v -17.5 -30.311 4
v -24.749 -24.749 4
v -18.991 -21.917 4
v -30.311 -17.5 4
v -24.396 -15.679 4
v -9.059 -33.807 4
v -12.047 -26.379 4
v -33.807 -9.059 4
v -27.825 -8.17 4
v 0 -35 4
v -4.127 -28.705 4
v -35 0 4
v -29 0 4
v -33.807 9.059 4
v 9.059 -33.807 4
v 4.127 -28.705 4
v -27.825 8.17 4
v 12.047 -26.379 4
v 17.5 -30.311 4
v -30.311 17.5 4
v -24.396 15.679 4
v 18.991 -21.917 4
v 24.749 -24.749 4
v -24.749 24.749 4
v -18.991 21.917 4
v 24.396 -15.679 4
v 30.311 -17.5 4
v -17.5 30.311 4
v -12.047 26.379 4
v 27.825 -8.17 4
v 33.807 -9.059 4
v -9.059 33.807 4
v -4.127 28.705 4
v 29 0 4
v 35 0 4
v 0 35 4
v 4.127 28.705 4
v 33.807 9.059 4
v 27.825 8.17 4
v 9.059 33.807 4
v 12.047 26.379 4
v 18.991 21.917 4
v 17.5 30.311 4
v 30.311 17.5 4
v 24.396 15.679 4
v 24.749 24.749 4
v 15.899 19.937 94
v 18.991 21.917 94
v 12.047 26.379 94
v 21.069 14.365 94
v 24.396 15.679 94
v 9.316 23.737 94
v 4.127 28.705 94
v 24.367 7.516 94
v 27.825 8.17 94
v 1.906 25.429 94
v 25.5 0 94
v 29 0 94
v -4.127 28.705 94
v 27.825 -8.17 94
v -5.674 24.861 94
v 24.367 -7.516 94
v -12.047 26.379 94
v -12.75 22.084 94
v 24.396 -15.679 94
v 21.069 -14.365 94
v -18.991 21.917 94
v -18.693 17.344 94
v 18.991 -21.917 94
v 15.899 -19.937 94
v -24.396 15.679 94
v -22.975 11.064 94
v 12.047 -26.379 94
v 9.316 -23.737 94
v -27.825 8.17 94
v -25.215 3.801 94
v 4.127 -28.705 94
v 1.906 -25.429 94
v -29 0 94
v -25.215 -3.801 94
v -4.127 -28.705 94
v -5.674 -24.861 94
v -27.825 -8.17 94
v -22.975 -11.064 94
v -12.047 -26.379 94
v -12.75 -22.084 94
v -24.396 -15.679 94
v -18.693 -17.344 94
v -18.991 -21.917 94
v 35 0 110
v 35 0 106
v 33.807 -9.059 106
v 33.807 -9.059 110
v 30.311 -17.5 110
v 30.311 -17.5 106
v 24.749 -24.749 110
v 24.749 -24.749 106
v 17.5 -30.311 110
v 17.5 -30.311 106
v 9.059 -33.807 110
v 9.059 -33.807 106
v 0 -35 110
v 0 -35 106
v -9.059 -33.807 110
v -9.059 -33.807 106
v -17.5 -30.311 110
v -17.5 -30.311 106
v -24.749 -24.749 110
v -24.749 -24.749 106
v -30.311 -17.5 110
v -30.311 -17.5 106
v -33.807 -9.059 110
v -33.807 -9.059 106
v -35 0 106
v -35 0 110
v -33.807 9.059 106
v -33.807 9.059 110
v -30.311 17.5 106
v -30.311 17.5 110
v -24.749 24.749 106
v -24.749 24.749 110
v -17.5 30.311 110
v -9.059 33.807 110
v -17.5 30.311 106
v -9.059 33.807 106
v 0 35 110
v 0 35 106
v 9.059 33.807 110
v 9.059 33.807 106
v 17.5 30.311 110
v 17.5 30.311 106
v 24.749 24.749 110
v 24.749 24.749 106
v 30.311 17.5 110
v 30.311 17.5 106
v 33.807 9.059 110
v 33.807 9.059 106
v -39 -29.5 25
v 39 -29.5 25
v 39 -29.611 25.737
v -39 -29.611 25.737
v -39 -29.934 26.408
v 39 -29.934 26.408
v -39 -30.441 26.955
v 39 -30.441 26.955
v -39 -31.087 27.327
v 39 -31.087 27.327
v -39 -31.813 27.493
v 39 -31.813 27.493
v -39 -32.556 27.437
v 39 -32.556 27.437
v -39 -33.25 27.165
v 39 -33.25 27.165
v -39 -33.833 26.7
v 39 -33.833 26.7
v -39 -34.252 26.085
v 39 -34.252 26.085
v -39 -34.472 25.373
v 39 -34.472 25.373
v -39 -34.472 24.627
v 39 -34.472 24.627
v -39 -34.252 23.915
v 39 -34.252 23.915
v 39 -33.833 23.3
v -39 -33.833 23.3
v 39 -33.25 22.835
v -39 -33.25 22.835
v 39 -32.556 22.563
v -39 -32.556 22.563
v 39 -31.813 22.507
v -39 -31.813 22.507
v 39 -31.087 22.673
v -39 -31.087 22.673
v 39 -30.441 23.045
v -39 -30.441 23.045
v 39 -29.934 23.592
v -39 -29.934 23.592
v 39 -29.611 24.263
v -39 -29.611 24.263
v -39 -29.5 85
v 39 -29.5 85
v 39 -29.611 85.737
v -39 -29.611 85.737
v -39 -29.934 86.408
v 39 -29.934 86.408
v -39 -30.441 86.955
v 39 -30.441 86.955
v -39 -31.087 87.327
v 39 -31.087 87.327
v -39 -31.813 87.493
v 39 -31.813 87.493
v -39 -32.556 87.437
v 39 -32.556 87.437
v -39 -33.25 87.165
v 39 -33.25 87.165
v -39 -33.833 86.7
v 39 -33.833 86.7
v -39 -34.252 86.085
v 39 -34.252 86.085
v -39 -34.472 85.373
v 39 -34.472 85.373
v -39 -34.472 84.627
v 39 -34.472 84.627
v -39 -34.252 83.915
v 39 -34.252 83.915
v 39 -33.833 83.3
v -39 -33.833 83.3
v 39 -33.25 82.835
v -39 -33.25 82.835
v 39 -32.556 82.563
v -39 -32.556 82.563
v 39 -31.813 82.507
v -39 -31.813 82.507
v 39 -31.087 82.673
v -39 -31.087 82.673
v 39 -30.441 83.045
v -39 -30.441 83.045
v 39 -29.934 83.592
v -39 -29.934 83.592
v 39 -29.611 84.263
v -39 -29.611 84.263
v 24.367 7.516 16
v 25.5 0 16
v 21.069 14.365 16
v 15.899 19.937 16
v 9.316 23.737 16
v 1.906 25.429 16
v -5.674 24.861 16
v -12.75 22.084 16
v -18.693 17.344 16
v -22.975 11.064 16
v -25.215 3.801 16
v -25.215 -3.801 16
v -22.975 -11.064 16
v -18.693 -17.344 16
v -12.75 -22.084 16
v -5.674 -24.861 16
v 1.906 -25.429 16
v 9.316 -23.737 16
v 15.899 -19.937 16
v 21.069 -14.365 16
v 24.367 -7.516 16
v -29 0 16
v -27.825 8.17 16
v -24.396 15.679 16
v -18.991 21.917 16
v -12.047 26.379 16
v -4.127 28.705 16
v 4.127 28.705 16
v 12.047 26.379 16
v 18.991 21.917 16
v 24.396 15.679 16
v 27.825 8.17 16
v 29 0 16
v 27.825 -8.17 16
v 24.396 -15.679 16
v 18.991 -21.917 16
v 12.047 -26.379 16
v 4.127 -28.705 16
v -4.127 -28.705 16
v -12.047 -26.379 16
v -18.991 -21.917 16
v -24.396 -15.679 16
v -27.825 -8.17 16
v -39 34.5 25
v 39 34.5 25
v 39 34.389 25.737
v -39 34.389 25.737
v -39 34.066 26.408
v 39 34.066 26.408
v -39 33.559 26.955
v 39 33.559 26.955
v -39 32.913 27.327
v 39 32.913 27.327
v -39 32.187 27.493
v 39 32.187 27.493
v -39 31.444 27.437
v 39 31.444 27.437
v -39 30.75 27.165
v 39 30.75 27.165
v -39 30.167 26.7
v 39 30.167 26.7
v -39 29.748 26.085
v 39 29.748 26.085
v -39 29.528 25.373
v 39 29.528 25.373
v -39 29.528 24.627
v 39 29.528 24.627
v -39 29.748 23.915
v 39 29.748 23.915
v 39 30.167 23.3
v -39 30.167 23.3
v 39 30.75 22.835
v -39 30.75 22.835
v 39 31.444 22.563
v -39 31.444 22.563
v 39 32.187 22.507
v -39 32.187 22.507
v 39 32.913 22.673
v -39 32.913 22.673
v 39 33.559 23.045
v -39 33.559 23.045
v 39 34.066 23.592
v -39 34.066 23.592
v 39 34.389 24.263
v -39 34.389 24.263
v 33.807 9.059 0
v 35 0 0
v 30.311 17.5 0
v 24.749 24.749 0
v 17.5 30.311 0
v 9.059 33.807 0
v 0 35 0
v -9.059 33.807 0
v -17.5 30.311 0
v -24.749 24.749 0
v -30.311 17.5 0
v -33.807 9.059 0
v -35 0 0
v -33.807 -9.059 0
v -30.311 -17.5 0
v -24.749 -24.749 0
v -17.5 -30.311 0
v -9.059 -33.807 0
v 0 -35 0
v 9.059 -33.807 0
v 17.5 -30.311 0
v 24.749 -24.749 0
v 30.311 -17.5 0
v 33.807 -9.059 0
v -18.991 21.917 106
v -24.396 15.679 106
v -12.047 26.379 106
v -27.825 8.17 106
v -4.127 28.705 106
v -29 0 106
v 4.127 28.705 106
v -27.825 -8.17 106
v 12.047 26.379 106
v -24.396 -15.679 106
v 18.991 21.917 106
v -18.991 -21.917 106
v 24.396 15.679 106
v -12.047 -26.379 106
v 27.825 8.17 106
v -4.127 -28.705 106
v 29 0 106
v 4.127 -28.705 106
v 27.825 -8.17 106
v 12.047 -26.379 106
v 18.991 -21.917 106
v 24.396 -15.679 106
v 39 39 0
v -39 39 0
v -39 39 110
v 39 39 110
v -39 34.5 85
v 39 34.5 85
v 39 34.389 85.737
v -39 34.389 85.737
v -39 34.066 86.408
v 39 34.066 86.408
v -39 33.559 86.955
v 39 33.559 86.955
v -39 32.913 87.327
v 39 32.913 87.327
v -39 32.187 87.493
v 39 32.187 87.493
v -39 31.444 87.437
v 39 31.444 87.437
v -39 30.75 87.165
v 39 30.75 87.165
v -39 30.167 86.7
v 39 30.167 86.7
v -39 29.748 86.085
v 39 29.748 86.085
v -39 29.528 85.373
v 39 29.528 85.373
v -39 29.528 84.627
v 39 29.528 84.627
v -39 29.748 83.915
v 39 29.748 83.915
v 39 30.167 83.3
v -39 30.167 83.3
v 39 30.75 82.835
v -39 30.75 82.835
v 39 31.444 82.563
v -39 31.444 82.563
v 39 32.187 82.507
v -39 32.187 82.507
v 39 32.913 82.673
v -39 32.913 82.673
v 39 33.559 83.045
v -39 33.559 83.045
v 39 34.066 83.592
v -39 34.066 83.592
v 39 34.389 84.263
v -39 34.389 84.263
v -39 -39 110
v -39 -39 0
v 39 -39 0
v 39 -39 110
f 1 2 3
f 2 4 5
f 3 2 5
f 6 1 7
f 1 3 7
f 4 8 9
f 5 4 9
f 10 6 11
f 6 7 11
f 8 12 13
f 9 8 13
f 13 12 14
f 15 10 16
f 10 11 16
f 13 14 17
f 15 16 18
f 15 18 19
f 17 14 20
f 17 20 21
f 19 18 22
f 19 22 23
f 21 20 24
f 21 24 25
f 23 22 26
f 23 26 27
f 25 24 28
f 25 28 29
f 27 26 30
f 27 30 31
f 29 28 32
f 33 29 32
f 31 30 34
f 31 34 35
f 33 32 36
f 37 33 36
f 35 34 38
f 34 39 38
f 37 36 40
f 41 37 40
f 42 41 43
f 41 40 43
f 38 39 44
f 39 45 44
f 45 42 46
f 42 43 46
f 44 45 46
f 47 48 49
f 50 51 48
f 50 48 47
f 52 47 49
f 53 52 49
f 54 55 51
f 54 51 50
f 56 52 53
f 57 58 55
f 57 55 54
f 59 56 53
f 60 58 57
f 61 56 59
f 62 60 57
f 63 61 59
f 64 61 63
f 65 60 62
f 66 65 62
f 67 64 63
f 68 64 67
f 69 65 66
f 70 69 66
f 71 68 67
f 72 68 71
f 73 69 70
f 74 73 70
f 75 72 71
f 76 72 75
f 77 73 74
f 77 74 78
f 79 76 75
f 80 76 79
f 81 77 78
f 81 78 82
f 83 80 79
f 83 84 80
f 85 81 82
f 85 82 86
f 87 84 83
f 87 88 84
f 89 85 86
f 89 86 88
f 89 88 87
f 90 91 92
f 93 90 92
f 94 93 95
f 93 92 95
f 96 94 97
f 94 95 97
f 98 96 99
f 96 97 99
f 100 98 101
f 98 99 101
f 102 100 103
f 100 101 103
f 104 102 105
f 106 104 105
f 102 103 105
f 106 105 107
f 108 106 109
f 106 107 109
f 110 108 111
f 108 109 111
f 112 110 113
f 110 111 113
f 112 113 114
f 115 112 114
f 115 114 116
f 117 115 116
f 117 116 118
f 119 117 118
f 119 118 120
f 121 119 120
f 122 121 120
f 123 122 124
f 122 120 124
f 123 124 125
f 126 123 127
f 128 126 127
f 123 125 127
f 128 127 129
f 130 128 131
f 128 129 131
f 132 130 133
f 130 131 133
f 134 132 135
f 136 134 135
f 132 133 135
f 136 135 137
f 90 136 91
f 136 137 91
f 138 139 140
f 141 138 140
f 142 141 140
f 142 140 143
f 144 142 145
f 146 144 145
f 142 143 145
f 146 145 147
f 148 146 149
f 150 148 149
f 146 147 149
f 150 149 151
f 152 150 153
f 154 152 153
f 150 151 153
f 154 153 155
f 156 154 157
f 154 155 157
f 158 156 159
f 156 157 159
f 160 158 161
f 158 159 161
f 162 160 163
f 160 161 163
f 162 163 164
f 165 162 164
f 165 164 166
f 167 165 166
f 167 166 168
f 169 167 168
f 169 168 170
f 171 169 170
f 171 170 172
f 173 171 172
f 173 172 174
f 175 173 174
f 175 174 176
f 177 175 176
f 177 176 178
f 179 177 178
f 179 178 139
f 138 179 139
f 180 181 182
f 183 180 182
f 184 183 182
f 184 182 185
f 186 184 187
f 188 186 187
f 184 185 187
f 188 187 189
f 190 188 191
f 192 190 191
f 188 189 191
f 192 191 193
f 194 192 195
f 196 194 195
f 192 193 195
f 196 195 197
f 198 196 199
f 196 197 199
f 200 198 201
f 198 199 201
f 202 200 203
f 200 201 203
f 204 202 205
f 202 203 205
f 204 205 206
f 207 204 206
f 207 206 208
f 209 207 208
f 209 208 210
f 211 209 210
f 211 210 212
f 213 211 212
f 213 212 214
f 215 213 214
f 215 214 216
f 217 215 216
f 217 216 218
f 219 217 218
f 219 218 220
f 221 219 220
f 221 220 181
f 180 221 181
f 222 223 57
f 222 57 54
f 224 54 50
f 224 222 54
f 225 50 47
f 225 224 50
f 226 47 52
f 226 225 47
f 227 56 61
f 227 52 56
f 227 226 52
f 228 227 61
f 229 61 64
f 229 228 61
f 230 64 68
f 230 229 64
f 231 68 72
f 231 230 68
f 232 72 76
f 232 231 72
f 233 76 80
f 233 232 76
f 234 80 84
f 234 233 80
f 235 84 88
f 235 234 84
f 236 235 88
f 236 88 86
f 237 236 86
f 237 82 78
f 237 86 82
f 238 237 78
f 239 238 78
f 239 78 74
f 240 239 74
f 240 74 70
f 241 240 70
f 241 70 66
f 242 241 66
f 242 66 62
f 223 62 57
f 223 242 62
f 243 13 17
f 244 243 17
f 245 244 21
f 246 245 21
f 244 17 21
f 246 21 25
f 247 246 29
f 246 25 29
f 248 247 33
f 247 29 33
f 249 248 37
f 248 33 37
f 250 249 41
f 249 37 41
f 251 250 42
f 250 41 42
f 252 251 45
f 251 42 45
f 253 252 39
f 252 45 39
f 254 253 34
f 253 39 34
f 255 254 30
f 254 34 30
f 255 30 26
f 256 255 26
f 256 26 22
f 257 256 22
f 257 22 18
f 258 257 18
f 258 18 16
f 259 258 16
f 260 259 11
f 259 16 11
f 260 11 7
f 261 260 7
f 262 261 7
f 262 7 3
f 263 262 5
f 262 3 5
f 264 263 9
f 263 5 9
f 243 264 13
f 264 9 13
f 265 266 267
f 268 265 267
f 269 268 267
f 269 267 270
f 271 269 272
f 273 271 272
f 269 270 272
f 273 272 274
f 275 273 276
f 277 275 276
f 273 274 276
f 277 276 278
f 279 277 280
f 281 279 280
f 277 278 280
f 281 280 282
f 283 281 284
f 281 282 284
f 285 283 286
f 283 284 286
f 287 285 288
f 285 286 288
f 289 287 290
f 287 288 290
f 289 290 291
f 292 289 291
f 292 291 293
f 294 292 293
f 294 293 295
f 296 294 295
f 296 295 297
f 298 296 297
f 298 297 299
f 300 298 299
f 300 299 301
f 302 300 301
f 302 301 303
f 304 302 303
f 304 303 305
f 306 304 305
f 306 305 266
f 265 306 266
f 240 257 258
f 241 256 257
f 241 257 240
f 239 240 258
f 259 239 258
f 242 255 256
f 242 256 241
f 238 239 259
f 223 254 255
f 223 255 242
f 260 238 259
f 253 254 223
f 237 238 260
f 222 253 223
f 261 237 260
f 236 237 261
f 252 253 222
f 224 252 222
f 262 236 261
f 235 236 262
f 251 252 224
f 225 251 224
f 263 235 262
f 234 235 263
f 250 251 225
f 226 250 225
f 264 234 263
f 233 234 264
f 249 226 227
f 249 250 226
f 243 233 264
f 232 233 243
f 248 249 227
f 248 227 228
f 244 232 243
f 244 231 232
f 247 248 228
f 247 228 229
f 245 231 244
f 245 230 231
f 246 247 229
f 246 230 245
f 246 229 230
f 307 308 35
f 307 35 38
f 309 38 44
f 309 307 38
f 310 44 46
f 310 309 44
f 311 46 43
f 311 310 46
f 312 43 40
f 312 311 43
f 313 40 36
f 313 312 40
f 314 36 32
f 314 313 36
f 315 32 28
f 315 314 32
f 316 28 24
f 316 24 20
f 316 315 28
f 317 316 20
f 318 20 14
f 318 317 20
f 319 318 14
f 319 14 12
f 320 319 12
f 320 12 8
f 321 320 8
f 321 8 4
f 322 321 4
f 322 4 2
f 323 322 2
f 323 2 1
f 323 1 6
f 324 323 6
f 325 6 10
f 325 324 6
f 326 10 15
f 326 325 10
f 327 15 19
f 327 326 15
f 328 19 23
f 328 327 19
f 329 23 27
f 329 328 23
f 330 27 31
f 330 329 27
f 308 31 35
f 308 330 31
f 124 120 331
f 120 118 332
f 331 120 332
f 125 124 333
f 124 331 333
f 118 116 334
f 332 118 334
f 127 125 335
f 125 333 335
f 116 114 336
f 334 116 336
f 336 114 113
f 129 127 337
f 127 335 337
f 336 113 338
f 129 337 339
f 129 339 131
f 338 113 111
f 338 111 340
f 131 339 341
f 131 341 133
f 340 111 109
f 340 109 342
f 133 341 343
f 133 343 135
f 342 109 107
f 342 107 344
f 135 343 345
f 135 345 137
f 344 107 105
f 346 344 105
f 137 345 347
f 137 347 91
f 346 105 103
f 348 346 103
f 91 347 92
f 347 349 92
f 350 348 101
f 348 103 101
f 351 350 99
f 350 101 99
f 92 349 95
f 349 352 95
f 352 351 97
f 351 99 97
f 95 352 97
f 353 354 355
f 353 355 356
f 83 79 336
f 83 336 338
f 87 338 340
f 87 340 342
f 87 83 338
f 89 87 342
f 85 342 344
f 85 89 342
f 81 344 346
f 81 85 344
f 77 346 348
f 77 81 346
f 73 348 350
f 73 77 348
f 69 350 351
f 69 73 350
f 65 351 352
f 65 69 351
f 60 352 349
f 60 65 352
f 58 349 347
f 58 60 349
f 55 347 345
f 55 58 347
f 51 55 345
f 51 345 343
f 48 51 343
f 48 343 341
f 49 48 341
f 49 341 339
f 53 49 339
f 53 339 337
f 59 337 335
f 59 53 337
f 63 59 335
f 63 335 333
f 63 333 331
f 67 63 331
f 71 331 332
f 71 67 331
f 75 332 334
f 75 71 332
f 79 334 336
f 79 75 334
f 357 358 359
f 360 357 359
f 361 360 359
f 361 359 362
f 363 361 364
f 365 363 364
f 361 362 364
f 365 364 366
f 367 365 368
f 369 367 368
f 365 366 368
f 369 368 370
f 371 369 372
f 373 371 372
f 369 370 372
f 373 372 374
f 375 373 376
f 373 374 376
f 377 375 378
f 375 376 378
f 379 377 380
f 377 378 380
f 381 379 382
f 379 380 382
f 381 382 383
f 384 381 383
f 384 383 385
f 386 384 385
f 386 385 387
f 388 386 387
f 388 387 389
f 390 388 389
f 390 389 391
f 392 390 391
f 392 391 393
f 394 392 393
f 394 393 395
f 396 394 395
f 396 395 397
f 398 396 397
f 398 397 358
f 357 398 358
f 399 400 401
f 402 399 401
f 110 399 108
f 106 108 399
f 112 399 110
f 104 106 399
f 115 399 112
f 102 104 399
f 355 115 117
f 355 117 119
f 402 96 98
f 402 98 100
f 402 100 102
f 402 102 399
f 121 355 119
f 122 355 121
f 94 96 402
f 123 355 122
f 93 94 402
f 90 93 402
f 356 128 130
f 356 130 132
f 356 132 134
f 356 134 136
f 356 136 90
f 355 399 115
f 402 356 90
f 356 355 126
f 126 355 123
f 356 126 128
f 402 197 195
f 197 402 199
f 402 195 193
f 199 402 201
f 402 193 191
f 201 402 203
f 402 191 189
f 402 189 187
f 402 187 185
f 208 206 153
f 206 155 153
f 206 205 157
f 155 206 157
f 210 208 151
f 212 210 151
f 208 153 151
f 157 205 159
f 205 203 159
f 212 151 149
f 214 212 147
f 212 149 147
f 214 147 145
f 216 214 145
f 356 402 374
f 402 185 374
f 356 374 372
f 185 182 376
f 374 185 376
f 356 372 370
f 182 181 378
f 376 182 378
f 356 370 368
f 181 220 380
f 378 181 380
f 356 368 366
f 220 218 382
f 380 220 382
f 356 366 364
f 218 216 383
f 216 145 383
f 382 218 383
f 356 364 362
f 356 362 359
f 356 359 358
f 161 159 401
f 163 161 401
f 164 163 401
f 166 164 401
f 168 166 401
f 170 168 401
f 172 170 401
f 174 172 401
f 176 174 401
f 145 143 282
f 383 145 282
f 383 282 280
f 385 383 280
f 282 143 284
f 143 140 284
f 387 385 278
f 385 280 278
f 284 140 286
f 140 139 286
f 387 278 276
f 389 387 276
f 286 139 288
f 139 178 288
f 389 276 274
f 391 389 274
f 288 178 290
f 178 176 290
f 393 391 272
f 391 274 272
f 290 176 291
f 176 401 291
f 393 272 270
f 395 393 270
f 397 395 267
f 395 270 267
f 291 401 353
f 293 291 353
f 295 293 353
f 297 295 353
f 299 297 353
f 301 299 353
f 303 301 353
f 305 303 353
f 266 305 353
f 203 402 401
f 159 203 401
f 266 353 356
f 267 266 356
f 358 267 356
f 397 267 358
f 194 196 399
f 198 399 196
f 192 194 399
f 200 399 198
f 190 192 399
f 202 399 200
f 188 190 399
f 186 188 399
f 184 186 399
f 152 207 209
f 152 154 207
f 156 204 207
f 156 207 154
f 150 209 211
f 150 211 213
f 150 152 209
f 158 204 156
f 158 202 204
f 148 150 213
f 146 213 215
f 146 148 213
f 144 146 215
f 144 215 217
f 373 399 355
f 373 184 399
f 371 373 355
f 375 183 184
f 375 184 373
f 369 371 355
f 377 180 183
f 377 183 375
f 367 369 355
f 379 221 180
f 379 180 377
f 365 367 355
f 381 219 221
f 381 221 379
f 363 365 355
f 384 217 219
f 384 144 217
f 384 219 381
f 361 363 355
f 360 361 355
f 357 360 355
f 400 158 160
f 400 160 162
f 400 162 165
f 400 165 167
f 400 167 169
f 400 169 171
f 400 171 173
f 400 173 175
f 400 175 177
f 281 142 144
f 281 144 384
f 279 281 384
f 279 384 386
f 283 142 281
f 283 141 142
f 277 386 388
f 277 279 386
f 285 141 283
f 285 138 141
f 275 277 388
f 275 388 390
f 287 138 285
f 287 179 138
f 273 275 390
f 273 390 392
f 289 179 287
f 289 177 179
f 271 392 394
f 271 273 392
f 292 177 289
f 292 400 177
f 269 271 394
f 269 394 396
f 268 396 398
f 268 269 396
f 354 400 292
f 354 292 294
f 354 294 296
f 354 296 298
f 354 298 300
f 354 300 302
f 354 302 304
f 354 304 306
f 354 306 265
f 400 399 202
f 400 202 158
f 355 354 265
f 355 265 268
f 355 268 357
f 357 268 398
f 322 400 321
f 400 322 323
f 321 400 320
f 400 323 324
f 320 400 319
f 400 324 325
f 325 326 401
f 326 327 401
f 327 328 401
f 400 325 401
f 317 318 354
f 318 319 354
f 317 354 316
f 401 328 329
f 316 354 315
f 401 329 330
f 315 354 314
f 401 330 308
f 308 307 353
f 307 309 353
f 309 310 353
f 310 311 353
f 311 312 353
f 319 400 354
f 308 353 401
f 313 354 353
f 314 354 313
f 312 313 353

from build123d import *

# Parameters (mm, degrees)
SKETCH1_W           = 78
SKETCH1_H           = 78
SKETCH1_R           = 25.5
BOSS_EXTRUDE1_DEPTH = 110
CUT_EXTRUDE1_START  = -4
SKETCH2_R           = 29
CUT_EXTRUDE1_DEPTH  = 12
CUT_EXTRUDE2_START  = -16
SKETCH3_R           = 29
CUT_EXTRUDE2_DEPTH  = 12
THRUST_AX4565_R     = 35
THRUST_AX4565_R_2   = 25
CUT_EXTRUDE6_DEPTH  = 4
CUT_EXTRUDE7_START  = 4
SKETCH13_R          = 35
SKETCH13_R_2        = 25
CUT_EXTRUDE7_DEPTH  = 4
SKETCH8_R           = 2.5
CUT_EXTRUDE3_DEPTH  = 141.374499109


with BuildPart() as part:
    # Sketch1 → Boss-Extrude1 (new body)
    with BuildSketch(Plane.XY):
        Rectangle(SKETCH1_W, SKETCH1_H)
        Circle(SKETCH1_R, mode=Mode.SUBTRACT)
    extrude(amount=BOSS_EXTRUDE1_DEPTH)

    # Sketch2 → Cut-Extrude1 (cut)
    with BuildSketch(Plane(origin=(0, 0, 0), x_dir=(-1, 0, 0), z_dir=(0, 0, -1)).offset(CUT_EXTRUDE1_START)):
        Circle(SKETCH2_R)
    extrude(amount=-CUT_EXTRUDE1_DEPTH, mode=Mode.SUBTRACT)

    # Sketch3 → Cut-Extrude2 (cut)
    with BuildSketch(Plane.XY.offset(110).offset(CUT_EXTRUDE2_START)):
        with Locations(Location((0, 0, 0), (0, 0, 180))):
            Circle(SKETCH3_R)
    extrude(amount=CUT_EXTRUDE2_DEPTH, mode=Mode.SUBTRACT)

    # Thrust AX4565 → Cut-Extrude6 (cut)
    with BuildSketch(Plane.XY):
        Circle(THRUST_AX4565_R)
        Circle(THRUST_AX4565_R_2, mode=Mode.SUBTRACT)
    extrude(amount=CUT_EXTRUDE6_DEPTH, mode=Mode.SUBTRACT)

    # Sketch13 → Cut-Extrude7 (cut)
    with BuildSketch(Plane(origin=(0, 0, 110), x_dir=(-1, 0, 0), z_dir=(0, 0, -1)).offset(CUT_EXTRUDE7_START)):
        with Locations(Location((0, 0, 0), (0, 0, 180))):
            Circle(SKETCH13_R)
        Circle(SKETCH13_R_2, mode=Mode.SUBTRACT)
    extrude(amount=-CUT_EXTRUDE7_DEPTH, mode=Mode.SUBTRACT)

    # Sketch8 → Cut-Extrude3 (cut, through all)
    with BuildSketch(Plane(origin=(39, 0, 0), x_dir=(0, 0, -1), z_dir=(1, 0, 0))):
        with Locations(Location((-85, 32, 0), (0, 0, 90))):
            Circle(SKETCH8_R)
        with Locations(Location((-25, 32, 0), (0, 0, 90))):
            Circle(SKETCH8_R)
        with Locations(Location((-25, -32, 0), (0, 0, 90))):
            Circle(SKETCH8_R)
        with Locations(Location((-85, -32, 0), (0, 0, 90))):
            Circle(SKETCH8_R)
    extrude(amount=-CUT_EXTRUDE3_DEPTH, mode=Mode.SUBTRACT)


solid = part.part
